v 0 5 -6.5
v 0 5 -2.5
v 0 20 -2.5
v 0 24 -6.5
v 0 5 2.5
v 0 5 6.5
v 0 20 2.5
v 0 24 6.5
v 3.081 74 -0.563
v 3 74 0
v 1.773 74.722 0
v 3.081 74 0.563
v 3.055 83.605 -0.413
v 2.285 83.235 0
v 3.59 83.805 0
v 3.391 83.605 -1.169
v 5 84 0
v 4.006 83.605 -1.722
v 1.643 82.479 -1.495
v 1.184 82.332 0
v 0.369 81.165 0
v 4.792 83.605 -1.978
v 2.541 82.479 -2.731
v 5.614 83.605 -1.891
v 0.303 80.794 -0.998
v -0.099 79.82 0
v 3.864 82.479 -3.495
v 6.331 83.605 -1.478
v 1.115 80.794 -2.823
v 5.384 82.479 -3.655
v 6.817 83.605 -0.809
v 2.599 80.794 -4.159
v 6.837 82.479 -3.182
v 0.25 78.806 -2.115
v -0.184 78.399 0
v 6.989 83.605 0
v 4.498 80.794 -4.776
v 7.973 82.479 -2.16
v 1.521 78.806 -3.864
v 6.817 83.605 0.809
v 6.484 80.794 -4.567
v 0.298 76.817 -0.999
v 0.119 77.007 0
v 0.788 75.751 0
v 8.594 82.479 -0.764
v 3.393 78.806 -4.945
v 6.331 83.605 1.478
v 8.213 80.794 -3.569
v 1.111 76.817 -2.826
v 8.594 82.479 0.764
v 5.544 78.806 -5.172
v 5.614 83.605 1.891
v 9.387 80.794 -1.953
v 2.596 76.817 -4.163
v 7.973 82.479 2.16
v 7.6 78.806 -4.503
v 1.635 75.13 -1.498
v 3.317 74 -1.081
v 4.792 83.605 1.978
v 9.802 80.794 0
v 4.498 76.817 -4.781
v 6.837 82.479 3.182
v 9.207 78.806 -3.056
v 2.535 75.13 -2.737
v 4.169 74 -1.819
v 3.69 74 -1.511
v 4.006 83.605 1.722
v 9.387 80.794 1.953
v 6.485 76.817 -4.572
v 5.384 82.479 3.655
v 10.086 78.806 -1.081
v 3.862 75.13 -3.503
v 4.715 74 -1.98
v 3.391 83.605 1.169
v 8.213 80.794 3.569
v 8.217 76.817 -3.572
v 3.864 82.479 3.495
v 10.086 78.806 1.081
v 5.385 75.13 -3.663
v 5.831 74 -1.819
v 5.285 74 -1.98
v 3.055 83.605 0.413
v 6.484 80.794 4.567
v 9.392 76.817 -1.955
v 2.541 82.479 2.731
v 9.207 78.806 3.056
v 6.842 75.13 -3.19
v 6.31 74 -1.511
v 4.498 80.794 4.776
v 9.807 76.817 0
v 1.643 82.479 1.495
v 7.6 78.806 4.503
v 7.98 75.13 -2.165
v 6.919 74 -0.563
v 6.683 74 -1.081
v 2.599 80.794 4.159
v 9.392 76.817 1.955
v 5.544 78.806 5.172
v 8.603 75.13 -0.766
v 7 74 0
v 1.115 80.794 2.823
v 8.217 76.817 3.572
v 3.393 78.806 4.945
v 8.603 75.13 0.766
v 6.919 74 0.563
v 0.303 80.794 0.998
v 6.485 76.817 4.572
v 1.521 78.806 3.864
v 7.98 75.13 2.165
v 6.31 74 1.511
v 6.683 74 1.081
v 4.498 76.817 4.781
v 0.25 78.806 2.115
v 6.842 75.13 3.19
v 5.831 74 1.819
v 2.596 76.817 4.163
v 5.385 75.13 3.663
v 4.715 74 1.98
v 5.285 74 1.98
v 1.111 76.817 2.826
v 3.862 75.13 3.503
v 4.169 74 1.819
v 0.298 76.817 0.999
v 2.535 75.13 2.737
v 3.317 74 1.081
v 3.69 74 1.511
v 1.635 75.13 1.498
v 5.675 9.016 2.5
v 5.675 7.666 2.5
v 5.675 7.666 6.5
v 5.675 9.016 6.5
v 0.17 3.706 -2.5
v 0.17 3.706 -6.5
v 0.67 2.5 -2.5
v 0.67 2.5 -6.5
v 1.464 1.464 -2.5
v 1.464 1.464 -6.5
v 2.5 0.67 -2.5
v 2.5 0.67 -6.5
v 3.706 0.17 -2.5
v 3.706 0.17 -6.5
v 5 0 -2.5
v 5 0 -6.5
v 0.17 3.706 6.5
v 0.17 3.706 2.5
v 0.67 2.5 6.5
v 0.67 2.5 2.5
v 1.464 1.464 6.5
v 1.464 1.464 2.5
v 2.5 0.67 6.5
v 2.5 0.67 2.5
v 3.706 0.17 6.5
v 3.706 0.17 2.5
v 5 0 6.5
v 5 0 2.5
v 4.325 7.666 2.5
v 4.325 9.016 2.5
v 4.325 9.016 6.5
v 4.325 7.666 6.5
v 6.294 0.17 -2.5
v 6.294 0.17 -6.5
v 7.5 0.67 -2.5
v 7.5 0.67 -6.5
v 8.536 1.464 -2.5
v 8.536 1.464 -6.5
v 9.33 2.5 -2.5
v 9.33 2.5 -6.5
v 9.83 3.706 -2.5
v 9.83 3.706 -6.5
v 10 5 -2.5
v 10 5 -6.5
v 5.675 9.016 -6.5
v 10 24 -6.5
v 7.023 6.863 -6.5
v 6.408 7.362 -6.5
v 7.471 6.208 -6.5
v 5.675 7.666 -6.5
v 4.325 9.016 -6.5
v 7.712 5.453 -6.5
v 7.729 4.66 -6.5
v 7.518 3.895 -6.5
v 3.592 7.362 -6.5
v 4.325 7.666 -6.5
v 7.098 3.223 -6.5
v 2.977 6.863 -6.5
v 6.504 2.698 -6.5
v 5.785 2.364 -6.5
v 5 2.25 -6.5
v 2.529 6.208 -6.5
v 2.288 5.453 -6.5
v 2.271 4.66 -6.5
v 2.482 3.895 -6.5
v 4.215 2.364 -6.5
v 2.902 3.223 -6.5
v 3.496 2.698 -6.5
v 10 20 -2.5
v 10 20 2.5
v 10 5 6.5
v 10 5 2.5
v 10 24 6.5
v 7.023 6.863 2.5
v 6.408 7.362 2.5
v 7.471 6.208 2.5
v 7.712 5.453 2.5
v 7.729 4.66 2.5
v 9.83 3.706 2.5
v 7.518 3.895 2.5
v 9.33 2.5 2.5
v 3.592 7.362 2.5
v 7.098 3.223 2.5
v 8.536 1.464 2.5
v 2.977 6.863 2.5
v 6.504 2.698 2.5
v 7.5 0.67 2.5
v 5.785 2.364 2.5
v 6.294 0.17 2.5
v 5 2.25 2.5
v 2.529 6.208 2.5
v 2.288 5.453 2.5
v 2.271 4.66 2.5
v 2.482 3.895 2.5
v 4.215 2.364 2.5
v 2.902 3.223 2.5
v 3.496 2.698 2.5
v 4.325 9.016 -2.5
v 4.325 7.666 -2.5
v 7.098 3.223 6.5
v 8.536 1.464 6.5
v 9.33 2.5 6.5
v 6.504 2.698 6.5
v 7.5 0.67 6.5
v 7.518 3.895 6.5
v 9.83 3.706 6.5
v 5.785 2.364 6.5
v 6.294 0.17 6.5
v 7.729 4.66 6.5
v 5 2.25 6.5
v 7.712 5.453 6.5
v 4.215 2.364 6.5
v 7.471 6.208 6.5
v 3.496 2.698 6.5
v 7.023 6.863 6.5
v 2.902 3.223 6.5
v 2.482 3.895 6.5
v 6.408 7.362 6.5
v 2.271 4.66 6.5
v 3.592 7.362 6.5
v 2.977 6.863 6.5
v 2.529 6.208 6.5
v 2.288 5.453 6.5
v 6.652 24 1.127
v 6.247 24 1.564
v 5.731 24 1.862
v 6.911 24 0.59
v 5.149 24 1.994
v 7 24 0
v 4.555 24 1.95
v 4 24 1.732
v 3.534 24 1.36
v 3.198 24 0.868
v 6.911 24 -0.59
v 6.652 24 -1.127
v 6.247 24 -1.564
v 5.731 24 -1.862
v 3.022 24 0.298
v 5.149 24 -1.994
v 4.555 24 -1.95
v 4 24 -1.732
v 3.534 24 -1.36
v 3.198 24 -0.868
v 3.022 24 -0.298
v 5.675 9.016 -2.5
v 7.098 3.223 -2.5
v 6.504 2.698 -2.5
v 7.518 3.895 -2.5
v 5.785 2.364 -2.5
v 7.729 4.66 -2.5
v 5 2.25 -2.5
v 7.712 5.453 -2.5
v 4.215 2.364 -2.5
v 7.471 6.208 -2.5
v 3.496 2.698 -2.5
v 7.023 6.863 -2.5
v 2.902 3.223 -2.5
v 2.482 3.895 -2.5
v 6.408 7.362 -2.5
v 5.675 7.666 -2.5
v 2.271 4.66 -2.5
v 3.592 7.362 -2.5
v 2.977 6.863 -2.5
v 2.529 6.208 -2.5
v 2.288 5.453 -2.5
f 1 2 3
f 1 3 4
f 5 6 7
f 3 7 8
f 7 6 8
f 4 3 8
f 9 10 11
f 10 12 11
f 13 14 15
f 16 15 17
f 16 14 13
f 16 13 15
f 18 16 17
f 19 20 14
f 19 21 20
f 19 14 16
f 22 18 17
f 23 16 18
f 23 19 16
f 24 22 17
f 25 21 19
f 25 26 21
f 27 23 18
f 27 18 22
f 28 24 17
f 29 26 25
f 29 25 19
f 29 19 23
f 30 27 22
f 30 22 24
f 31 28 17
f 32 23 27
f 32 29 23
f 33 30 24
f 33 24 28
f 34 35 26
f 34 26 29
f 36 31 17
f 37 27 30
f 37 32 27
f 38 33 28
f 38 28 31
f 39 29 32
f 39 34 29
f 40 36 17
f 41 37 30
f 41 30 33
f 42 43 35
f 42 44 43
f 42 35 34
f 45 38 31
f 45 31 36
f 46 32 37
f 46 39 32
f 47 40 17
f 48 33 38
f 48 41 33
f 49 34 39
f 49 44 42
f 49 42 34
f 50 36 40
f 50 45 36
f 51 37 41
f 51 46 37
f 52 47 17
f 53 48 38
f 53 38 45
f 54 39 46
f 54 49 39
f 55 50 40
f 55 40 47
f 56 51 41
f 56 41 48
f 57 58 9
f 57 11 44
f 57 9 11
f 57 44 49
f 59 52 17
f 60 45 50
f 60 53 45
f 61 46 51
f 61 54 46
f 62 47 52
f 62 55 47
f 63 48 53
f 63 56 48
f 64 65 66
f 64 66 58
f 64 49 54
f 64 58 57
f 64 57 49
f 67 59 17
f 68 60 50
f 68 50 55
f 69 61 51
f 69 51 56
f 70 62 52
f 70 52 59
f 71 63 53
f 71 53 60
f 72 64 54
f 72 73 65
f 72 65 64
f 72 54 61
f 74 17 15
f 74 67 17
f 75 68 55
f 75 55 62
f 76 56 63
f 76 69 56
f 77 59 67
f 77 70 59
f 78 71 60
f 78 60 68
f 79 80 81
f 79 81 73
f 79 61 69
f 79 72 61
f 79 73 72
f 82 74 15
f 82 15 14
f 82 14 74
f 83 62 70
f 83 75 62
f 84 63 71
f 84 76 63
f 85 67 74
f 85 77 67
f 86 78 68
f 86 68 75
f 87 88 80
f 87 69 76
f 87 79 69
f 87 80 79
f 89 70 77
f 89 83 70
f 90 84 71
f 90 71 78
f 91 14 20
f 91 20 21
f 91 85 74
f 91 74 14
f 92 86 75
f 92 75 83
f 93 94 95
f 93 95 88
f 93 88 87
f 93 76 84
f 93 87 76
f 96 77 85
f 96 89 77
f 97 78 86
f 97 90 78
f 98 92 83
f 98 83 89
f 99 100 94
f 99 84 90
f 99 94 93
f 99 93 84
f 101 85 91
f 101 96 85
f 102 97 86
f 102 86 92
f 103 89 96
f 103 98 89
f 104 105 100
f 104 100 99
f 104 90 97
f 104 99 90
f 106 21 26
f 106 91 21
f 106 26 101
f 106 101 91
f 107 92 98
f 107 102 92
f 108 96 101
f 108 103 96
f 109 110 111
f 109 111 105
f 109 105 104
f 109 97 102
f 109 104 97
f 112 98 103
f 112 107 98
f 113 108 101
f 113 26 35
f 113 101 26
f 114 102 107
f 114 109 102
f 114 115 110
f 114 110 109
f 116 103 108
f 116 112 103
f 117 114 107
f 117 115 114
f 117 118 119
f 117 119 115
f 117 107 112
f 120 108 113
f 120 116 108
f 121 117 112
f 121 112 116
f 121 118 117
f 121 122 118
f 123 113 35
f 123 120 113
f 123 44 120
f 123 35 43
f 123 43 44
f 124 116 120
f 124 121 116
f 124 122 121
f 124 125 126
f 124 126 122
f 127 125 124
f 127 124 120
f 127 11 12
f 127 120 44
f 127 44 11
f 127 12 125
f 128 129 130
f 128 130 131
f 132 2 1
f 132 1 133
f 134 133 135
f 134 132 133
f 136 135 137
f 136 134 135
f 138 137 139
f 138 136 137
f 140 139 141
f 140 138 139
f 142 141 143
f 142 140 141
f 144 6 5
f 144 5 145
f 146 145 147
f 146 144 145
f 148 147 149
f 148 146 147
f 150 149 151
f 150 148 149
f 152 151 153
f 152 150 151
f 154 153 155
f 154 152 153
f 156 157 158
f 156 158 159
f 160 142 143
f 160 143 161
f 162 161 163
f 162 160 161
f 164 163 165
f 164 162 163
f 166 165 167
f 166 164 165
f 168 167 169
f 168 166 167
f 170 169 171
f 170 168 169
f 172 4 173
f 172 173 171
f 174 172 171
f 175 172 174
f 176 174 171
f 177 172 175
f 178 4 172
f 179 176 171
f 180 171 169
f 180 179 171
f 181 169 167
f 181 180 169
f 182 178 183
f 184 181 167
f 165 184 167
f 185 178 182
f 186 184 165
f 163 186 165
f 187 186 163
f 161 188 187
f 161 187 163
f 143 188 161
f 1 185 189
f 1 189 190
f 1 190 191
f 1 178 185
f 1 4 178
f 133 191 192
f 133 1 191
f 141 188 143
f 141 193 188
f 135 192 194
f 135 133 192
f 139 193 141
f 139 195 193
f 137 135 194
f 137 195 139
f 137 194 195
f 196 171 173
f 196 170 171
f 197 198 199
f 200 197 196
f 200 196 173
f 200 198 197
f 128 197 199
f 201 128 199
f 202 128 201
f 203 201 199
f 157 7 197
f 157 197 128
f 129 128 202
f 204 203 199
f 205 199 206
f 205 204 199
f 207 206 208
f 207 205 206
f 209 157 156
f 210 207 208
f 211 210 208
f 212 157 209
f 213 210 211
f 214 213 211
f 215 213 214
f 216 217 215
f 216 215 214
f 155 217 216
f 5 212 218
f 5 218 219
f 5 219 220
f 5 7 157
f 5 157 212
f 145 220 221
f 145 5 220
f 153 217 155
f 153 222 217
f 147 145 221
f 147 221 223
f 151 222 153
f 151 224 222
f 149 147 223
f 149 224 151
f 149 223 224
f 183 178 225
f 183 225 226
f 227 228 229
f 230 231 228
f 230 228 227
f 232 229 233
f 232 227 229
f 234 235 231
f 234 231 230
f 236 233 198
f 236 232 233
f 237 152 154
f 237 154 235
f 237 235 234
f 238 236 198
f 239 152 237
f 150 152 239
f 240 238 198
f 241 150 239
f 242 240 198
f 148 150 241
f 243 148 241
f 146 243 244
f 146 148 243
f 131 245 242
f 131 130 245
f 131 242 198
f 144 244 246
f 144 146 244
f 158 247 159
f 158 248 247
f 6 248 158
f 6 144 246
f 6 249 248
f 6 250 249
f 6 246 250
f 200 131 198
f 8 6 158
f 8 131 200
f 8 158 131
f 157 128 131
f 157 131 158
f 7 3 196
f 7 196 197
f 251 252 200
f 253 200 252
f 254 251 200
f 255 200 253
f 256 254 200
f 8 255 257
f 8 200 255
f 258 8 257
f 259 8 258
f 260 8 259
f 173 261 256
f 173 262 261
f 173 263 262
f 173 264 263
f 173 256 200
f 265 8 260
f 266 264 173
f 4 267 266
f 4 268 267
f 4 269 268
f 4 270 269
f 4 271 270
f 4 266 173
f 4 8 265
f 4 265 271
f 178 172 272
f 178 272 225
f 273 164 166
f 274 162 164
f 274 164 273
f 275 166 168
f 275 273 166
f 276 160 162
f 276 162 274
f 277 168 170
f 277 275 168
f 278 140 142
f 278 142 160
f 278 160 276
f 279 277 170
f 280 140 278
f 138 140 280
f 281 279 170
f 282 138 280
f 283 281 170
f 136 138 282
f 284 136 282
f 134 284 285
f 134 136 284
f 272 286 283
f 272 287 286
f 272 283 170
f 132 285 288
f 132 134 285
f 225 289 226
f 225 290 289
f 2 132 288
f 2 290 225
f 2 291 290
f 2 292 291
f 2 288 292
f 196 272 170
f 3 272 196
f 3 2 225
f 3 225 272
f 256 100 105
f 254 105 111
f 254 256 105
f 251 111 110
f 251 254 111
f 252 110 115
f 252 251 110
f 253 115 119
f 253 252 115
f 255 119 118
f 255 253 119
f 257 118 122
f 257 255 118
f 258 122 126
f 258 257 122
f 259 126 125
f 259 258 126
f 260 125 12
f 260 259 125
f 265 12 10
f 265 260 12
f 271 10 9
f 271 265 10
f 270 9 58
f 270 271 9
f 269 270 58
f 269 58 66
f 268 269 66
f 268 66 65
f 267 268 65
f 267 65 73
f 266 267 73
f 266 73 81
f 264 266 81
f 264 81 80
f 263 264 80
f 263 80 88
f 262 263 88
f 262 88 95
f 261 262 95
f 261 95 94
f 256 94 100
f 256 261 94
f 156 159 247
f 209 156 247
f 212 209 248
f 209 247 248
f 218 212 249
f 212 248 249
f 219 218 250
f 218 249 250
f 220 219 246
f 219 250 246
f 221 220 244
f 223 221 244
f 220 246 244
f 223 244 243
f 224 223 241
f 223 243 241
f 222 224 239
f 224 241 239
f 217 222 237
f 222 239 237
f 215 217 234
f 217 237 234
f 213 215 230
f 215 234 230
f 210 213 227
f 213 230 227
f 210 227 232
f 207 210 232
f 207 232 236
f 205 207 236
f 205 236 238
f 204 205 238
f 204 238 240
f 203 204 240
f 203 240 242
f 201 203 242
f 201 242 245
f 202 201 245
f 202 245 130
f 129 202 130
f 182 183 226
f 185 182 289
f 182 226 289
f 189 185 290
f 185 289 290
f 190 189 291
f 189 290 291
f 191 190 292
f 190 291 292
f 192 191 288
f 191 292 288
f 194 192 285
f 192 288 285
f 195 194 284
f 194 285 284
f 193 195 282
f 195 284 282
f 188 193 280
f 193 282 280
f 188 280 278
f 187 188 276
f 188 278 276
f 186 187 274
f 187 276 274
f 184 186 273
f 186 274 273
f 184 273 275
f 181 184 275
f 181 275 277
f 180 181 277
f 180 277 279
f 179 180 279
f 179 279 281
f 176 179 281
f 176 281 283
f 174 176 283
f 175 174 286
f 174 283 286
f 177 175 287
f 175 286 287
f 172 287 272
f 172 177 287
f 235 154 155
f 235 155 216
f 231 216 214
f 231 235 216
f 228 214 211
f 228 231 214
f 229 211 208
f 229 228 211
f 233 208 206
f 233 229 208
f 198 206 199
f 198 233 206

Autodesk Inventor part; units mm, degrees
ref_plane "YZ Plane" through (0, 0, 0) normal (1, 0, 0) x (0, 1, 0)
ref_plane "XZ Plane" through (0, 0, 0) normal (0, 1, 0) x (-1, 0, 0)
ref_plane "XY Plane" through (0, 0, 0) normal (0, 0, 1) x (1, 0, 0)
sketch "Sketch1" plane through (0, 0, 0) normal (1, 0, 0) x (0, 1, 0)
  line L0 (0, 6.5) -> (24, 6.5)
  line L1 (24, 6.5) -> (24, -6.5)
  line L2 (24, -6.5) -> (0, -6.5)
  line L3 (0, -6.5) -> (0, -2.5)
  line L4 (0, -2.5) -> (20, -2.5)
  line L5 (20, -2.5) -> (20, 2.5)
  line L6 (20, 2.5) -> (0, 2.5)
  line L7 (0, 2.5) -> (0, 6.5)
  point P0 (0, 0)
  dimension "d0" = 4
  dimension "d1" = 20
  dimension "d2" = 4
  dimension "d3" = 5
  dimension "d11" = 2.5
  dimension "d12" = 0
extrude "Extrusion1" add sketch "Sketch1" along normal blind 10
sketch "Sketch2" plane through (0, 24, 6.5) normal (0, 1, 0) x (1, 0, 0)
  circle A0 centre (5, 6.5) radius 2
  line L0 (0, 0) -> (0, 13) projected
  line L1 (0, 13) -> (10, 13) projected
  point P0 (0, 6.5)
  dimension "d6" = 4
  dimension "d7" = 5
  dimension "d8" = 6.5
extrude "Extrusion2" add sketch "Sketch2" along normal blind 50
sketch "Sketch3" plane through (0, 0, 0) normal (0, 0, 1) x (1, 0, 0)
  line L0 (7, 74) -> (3, 74) projected
  line L1 (3, 74) -> (5, 74)
  line L2 (5, 74) -> (5, 84)
  arc A0 (5, 84) -> (3, 74) centre (5, 78.8) ccw
  point P0 (0, 0)
  dimension "d13" = 10
revolve "Revolution1" add sketch "Sketch3" angle 360 about axis through (5, 74, 0) along (0, 1, 0)
fillet "Fillet1" radius 5 4 edges at (0, 0, -4.5) (10, 0, -4.5) (10, 0, 4.5) (0, 0, 4.5)
hole "Hole1" at (5, 5, -6.5) direction (0, 0, 1) diameter 5.5 end through all
sketch "Sketch4" plane through (10, 24, -6.5) normal (0, 0, -1) x (-1, 0, 0)
  circle A0 centre (5, -19) radius 2.75 projected
  line L0 (4.325, -16.3341) -> (4.325, -14.9841)
  line L1 (4.325, -14.9841) -> (5.675, -14.9841)
  line L2 (5.675, -14.9841) -> (5.675, -16.3341)
  line L3 (4.325, -16.3341) -> (5.675, -16.3341)
  point P0 (10, -24)
  dimension "d25" = 1.35
  dimension "d26" = 0.675
  dimension "d27" = 1.35
extrude "Extrusion3" cut sketch "Sketch4" against normal through all contours A0 L0 L1 L2
properties part number "EndJoint"
